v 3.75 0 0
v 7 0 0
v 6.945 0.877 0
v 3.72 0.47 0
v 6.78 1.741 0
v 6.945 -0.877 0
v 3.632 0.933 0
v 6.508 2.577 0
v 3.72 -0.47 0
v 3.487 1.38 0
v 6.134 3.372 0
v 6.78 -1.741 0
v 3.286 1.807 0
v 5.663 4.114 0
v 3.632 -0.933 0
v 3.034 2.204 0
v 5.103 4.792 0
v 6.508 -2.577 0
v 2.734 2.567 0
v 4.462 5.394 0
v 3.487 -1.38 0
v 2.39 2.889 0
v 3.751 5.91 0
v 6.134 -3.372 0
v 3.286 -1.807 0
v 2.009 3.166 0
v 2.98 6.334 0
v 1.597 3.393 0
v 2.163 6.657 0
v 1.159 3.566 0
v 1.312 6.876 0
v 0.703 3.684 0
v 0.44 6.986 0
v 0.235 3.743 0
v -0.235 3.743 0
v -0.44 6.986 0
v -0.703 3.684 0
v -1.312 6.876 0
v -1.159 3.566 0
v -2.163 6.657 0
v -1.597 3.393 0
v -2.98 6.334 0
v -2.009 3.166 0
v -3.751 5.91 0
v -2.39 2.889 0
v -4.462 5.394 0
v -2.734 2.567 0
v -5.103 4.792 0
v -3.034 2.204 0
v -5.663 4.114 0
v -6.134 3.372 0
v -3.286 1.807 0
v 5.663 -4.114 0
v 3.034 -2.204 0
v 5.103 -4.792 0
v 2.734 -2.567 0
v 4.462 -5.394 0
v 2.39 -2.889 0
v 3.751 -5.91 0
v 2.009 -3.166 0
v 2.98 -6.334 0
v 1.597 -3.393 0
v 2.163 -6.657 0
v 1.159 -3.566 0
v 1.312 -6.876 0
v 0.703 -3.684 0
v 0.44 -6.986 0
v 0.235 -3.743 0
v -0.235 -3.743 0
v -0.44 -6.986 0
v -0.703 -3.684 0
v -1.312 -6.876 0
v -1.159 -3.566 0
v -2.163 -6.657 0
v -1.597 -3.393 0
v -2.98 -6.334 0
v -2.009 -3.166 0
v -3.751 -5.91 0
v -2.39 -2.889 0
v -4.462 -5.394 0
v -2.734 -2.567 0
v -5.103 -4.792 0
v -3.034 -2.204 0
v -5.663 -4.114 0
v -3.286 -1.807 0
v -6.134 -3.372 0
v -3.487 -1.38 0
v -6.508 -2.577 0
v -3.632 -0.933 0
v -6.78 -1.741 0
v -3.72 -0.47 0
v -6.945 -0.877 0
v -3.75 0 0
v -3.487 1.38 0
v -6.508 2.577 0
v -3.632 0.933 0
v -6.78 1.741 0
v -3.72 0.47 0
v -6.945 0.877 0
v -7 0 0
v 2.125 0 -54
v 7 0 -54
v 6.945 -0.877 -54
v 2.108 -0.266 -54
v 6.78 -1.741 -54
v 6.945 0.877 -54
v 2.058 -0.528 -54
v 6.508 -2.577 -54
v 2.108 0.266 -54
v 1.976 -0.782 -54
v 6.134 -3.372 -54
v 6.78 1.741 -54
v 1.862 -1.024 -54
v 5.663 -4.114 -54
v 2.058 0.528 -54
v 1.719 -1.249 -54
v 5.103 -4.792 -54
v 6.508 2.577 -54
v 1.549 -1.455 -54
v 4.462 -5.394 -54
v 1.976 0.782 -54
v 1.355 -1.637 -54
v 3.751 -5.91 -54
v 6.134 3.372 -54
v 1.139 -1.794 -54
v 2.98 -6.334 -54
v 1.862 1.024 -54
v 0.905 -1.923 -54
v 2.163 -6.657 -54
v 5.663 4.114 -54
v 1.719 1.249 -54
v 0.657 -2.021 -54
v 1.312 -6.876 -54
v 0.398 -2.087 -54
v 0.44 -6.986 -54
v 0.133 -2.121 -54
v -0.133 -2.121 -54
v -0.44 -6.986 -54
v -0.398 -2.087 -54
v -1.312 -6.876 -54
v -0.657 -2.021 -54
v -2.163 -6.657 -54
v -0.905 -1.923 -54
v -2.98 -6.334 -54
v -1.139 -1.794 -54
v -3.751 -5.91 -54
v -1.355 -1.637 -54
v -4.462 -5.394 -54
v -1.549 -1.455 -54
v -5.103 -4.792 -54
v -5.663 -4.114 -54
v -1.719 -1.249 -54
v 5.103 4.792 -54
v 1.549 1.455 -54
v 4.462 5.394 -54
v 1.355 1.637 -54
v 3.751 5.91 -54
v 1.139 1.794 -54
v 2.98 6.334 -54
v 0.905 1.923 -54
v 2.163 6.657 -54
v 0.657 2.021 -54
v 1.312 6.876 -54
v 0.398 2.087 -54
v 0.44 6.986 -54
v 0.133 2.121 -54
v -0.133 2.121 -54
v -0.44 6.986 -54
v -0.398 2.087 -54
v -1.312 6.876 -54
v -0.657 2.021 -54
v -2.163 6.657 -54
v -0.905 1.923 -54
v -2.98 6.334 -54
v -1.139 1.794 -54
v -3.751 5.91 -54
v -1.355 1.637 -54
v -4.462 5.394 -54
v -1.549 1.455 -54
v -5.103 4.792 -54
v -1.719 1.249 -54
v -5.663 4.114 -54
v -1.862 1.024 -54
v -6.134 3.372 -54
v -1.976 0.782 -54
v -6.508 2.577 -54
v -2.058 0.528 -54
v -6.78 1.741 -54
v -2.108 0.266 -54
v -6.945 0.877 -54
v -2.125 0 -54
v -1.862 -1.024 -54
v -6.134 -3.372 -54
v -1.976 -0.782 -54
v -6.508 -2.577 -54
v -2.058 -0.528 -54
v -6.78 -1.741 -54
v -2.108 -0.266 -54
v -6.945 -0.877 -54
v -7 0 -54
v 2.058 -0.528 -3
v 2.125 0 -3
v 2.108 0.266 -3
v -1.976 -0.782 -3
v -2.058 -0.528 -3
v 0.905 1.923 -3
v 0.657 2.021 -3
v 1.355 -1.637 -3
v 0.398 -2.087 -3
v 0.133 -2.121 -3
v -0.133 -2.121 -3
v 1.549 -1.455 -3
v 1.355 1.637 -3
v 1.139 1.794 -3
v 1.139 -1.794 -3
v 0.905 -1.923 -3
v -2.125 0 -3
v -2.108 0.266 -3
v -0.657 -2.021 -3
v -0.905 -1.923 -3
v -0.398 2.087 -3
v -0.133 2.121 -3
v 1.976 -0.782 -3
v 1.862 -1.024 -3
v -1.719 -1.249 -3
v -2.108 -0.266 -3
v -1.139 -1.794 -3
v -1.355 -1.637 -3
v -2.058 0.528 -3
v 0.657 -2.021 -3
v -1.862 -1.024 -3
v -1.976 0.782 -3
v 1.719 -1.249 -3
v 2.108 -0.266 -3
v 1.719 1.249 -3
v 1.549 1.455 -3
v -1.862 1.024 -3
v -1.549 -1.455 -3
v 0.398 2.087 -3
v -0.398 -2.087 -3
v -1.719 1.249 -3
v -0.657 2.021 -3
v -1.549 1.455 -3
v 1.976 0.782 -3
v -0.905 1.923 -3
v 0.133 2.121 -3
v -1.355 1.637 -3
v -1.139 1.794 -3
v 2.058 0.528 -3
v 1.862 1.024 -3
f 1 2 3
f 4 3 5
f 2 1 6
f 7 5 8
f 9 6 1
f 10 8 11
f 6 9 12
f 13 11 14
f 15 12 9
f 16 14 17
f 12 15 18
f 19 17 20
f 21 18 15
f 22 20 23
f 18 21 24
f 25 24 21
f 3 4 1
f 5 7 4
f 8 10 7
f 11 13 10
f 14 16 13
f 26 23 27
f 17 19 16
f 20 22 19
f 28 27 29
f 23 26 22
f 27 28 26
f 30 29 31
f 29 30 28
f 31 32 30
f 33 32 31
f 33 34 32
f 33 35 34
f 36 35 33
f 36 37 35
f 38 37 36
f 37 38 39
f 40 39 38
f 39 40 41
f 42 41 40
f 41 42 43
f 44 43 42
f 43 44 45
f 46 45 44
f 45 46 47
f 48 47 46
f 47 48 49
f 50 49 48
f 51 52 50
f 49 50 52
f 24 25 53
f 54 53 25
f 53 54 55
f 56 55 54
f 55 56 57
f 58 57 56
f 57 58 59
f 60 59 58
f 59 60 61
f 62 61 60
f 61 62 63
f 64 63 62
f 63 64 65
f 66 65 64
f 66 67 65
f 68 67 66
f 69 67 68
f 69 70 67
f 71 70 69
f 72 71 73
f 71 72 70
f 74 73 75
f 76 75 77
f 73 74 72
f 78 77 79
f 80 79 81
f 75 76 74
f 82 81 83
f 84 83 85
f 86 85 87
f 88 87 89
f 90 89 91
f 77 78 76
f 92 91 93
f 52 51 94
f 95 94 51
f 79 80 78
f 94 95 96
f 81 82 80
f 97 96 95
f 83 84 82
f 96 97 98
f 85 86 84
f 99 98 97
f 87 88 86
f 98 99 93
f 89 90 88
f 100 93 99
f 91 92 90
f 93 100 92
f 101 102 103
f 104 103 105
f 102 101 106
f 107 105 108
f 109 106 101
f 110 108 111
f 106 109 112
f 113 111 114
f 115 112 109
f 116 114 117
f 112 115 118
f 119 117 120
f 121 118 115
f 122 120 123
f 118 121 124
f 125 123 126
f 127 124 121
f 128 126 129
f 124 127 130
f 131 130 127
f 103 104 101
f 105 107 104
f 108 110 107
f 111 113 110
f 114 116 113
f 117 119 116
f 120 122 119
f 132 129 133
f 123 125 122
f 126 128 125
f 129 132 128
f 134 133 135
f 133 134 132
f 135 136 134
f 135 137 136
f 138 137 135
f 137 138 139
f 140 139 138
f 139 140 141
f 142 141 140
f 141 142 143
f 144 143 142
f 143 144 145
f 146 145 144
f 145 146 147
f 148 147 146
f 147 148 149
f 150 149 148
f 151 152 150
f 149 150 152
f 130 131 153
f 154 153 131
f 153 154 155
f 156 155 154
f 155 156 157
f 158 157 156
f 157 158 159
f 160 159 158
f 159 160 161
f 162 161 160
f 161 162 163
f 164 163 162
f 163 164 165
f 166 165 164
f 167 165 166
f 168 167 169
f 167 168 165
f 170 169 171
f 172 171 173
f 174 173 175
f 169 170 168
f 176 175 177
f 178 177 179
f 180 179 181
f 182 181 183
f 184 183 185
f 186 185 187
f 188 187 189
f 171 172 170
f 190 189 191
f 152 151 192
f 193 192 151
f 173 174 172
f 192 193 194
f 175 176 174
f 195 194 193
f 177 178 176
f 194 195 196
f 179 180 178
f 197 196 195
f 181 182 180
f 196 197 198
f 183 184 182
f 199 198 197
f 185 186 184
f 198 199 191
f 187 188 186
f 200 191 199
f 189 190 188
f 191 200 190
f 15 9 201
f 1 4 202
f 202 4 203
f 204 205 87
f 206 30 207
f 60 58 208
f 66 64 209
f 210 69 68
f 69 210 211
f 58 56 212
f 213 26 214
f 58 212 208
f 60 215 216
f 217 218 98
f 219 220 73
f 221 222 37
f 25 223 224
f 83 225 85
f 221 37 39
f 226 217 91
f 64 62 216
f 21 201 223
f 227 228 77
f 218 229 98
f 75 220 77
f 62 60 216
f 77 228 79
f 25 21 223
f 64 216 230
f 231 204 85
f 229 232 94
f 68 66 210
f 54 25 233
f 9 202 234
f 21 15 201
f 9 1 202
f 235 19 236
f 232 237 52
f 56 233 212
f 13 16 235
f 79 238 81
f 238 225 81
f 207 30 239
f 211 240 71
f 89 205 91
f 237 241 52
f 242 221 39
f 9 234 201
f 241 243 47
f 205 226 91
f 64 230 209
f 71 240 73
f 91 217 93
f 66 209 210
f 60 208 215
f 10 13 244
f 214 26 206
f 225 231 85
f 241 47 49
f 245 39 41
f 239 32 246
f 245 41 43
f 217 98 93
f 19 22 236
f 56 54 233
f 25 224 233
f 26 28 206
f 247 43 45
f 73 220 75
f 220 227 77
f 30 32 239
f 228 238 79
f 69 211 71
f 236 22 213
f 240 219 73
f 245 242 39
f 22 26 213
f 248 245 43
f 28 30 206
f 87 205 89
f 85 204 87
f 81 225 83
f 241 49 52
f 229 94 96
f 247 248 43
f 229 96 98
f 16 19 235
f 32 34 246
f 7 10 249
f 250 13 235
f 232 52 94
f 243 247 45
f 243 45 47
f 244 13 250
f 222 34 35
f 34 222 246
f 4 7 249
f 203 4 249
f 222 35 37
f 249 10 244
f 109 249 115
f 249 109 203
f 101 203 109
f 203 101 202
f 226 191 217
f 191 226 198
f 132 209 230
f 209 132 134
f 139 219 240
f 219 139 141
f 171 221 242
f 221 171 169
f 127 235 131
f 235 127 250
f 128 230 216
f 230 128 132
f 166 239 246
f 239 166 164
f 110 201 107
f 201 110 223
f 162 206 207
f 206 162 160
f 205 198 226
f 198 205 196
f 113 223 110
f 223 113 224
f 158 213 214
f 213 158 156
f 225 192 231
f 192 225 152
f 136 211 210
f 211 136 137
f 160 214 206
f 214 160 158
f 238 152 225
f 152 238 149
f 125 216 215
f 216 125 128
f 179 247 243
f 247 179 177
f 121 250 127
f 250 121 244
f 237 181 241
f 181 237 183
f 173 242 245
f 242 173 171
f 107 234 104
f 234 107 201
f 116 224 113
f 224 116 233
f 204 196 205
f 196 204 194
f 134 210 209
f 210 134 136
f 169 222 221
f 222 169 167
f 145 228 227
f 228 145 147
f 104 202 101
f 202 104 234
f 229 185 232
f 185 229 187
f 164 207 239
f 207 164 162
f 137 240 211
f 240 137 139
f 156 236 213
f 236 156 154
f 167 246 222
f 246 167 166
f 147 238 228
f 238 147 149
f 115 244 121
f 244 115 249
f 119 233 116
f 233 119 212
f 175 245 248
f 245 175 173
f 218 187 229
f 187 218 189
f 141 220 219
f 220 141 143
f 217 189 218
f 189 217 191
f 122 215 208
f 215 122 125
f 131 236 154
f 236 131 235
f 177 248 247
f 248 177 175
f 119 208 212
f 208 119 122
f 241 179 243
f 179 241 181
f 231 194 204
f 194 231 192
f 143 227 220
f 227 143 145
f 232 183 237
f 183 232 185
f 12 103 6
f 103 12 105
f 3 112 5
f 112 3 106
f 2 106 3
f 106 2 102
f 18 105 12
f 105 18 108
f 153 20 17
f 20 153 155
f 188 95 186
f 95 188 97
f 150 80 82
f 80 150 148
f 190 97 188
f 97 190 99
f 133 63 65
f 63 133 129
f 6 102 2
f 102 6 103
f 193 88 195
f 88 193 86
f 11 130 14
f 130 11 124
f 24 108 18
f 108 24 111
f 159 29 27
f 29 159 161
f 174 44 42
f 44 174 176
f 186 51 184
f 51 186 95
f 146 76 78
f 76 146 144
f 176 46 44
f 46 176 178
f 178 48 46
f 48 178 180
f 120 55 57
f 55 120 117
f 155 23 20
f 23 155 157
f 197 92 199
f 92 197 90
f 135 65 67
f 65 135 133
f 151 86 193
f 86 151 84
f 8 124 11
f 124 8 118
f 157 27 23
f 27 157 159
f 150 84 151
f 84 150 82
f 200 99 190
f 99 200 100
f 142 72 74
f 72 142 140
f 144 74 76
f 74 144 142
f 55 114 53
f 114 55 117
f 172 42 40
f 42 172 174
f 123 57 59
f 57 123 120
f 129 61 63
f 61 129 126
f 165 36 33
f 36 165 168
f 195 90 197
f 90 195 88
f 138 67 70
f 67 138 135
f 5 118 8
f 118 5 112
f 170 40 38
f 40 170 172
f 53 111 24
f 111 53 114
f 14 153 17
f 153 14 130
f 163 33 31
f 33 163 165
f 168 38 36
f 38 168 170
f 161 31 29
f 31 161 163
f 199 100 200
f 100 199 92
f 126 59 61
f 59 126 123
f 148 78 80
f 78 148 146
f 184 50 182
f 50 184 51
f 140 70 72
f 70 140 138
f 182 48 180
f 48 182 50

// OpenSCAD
$fn = 50;


difference() {
	union() {
		translate(v = [0, 0, -54.0000000000]) {
			cylinder(h = 54, r = 7.0000000000);
		}
		cylinder(h = 0, r = 10.0000000000);
	}
	union() {
		translate(v = [0, 0, 0]) {
			rotate(a = [0, 0, 0]) {
				difference() {
					union() {
						#translate(v = [0, 0, -54.0000000000]) {
							cylinder(h = 54, r = 2.0000000000);
						}
						#translate(v = [0, 0, -3]) {
							cylinder(h = 3, r1 = 2.1250000000, r2 = 3.7500000000);
						}
						#translate(v = [0, 0, -54.0000000000]) {
							cylinder(h = 54, r = 2.1250000000);
						}
						#translate(v = [0, 0, -54.0000000000]) {
							cylinder(h = 54, r = 2.0000000000);
						}
					}
					union();
				}
			}
		}
	}
}
